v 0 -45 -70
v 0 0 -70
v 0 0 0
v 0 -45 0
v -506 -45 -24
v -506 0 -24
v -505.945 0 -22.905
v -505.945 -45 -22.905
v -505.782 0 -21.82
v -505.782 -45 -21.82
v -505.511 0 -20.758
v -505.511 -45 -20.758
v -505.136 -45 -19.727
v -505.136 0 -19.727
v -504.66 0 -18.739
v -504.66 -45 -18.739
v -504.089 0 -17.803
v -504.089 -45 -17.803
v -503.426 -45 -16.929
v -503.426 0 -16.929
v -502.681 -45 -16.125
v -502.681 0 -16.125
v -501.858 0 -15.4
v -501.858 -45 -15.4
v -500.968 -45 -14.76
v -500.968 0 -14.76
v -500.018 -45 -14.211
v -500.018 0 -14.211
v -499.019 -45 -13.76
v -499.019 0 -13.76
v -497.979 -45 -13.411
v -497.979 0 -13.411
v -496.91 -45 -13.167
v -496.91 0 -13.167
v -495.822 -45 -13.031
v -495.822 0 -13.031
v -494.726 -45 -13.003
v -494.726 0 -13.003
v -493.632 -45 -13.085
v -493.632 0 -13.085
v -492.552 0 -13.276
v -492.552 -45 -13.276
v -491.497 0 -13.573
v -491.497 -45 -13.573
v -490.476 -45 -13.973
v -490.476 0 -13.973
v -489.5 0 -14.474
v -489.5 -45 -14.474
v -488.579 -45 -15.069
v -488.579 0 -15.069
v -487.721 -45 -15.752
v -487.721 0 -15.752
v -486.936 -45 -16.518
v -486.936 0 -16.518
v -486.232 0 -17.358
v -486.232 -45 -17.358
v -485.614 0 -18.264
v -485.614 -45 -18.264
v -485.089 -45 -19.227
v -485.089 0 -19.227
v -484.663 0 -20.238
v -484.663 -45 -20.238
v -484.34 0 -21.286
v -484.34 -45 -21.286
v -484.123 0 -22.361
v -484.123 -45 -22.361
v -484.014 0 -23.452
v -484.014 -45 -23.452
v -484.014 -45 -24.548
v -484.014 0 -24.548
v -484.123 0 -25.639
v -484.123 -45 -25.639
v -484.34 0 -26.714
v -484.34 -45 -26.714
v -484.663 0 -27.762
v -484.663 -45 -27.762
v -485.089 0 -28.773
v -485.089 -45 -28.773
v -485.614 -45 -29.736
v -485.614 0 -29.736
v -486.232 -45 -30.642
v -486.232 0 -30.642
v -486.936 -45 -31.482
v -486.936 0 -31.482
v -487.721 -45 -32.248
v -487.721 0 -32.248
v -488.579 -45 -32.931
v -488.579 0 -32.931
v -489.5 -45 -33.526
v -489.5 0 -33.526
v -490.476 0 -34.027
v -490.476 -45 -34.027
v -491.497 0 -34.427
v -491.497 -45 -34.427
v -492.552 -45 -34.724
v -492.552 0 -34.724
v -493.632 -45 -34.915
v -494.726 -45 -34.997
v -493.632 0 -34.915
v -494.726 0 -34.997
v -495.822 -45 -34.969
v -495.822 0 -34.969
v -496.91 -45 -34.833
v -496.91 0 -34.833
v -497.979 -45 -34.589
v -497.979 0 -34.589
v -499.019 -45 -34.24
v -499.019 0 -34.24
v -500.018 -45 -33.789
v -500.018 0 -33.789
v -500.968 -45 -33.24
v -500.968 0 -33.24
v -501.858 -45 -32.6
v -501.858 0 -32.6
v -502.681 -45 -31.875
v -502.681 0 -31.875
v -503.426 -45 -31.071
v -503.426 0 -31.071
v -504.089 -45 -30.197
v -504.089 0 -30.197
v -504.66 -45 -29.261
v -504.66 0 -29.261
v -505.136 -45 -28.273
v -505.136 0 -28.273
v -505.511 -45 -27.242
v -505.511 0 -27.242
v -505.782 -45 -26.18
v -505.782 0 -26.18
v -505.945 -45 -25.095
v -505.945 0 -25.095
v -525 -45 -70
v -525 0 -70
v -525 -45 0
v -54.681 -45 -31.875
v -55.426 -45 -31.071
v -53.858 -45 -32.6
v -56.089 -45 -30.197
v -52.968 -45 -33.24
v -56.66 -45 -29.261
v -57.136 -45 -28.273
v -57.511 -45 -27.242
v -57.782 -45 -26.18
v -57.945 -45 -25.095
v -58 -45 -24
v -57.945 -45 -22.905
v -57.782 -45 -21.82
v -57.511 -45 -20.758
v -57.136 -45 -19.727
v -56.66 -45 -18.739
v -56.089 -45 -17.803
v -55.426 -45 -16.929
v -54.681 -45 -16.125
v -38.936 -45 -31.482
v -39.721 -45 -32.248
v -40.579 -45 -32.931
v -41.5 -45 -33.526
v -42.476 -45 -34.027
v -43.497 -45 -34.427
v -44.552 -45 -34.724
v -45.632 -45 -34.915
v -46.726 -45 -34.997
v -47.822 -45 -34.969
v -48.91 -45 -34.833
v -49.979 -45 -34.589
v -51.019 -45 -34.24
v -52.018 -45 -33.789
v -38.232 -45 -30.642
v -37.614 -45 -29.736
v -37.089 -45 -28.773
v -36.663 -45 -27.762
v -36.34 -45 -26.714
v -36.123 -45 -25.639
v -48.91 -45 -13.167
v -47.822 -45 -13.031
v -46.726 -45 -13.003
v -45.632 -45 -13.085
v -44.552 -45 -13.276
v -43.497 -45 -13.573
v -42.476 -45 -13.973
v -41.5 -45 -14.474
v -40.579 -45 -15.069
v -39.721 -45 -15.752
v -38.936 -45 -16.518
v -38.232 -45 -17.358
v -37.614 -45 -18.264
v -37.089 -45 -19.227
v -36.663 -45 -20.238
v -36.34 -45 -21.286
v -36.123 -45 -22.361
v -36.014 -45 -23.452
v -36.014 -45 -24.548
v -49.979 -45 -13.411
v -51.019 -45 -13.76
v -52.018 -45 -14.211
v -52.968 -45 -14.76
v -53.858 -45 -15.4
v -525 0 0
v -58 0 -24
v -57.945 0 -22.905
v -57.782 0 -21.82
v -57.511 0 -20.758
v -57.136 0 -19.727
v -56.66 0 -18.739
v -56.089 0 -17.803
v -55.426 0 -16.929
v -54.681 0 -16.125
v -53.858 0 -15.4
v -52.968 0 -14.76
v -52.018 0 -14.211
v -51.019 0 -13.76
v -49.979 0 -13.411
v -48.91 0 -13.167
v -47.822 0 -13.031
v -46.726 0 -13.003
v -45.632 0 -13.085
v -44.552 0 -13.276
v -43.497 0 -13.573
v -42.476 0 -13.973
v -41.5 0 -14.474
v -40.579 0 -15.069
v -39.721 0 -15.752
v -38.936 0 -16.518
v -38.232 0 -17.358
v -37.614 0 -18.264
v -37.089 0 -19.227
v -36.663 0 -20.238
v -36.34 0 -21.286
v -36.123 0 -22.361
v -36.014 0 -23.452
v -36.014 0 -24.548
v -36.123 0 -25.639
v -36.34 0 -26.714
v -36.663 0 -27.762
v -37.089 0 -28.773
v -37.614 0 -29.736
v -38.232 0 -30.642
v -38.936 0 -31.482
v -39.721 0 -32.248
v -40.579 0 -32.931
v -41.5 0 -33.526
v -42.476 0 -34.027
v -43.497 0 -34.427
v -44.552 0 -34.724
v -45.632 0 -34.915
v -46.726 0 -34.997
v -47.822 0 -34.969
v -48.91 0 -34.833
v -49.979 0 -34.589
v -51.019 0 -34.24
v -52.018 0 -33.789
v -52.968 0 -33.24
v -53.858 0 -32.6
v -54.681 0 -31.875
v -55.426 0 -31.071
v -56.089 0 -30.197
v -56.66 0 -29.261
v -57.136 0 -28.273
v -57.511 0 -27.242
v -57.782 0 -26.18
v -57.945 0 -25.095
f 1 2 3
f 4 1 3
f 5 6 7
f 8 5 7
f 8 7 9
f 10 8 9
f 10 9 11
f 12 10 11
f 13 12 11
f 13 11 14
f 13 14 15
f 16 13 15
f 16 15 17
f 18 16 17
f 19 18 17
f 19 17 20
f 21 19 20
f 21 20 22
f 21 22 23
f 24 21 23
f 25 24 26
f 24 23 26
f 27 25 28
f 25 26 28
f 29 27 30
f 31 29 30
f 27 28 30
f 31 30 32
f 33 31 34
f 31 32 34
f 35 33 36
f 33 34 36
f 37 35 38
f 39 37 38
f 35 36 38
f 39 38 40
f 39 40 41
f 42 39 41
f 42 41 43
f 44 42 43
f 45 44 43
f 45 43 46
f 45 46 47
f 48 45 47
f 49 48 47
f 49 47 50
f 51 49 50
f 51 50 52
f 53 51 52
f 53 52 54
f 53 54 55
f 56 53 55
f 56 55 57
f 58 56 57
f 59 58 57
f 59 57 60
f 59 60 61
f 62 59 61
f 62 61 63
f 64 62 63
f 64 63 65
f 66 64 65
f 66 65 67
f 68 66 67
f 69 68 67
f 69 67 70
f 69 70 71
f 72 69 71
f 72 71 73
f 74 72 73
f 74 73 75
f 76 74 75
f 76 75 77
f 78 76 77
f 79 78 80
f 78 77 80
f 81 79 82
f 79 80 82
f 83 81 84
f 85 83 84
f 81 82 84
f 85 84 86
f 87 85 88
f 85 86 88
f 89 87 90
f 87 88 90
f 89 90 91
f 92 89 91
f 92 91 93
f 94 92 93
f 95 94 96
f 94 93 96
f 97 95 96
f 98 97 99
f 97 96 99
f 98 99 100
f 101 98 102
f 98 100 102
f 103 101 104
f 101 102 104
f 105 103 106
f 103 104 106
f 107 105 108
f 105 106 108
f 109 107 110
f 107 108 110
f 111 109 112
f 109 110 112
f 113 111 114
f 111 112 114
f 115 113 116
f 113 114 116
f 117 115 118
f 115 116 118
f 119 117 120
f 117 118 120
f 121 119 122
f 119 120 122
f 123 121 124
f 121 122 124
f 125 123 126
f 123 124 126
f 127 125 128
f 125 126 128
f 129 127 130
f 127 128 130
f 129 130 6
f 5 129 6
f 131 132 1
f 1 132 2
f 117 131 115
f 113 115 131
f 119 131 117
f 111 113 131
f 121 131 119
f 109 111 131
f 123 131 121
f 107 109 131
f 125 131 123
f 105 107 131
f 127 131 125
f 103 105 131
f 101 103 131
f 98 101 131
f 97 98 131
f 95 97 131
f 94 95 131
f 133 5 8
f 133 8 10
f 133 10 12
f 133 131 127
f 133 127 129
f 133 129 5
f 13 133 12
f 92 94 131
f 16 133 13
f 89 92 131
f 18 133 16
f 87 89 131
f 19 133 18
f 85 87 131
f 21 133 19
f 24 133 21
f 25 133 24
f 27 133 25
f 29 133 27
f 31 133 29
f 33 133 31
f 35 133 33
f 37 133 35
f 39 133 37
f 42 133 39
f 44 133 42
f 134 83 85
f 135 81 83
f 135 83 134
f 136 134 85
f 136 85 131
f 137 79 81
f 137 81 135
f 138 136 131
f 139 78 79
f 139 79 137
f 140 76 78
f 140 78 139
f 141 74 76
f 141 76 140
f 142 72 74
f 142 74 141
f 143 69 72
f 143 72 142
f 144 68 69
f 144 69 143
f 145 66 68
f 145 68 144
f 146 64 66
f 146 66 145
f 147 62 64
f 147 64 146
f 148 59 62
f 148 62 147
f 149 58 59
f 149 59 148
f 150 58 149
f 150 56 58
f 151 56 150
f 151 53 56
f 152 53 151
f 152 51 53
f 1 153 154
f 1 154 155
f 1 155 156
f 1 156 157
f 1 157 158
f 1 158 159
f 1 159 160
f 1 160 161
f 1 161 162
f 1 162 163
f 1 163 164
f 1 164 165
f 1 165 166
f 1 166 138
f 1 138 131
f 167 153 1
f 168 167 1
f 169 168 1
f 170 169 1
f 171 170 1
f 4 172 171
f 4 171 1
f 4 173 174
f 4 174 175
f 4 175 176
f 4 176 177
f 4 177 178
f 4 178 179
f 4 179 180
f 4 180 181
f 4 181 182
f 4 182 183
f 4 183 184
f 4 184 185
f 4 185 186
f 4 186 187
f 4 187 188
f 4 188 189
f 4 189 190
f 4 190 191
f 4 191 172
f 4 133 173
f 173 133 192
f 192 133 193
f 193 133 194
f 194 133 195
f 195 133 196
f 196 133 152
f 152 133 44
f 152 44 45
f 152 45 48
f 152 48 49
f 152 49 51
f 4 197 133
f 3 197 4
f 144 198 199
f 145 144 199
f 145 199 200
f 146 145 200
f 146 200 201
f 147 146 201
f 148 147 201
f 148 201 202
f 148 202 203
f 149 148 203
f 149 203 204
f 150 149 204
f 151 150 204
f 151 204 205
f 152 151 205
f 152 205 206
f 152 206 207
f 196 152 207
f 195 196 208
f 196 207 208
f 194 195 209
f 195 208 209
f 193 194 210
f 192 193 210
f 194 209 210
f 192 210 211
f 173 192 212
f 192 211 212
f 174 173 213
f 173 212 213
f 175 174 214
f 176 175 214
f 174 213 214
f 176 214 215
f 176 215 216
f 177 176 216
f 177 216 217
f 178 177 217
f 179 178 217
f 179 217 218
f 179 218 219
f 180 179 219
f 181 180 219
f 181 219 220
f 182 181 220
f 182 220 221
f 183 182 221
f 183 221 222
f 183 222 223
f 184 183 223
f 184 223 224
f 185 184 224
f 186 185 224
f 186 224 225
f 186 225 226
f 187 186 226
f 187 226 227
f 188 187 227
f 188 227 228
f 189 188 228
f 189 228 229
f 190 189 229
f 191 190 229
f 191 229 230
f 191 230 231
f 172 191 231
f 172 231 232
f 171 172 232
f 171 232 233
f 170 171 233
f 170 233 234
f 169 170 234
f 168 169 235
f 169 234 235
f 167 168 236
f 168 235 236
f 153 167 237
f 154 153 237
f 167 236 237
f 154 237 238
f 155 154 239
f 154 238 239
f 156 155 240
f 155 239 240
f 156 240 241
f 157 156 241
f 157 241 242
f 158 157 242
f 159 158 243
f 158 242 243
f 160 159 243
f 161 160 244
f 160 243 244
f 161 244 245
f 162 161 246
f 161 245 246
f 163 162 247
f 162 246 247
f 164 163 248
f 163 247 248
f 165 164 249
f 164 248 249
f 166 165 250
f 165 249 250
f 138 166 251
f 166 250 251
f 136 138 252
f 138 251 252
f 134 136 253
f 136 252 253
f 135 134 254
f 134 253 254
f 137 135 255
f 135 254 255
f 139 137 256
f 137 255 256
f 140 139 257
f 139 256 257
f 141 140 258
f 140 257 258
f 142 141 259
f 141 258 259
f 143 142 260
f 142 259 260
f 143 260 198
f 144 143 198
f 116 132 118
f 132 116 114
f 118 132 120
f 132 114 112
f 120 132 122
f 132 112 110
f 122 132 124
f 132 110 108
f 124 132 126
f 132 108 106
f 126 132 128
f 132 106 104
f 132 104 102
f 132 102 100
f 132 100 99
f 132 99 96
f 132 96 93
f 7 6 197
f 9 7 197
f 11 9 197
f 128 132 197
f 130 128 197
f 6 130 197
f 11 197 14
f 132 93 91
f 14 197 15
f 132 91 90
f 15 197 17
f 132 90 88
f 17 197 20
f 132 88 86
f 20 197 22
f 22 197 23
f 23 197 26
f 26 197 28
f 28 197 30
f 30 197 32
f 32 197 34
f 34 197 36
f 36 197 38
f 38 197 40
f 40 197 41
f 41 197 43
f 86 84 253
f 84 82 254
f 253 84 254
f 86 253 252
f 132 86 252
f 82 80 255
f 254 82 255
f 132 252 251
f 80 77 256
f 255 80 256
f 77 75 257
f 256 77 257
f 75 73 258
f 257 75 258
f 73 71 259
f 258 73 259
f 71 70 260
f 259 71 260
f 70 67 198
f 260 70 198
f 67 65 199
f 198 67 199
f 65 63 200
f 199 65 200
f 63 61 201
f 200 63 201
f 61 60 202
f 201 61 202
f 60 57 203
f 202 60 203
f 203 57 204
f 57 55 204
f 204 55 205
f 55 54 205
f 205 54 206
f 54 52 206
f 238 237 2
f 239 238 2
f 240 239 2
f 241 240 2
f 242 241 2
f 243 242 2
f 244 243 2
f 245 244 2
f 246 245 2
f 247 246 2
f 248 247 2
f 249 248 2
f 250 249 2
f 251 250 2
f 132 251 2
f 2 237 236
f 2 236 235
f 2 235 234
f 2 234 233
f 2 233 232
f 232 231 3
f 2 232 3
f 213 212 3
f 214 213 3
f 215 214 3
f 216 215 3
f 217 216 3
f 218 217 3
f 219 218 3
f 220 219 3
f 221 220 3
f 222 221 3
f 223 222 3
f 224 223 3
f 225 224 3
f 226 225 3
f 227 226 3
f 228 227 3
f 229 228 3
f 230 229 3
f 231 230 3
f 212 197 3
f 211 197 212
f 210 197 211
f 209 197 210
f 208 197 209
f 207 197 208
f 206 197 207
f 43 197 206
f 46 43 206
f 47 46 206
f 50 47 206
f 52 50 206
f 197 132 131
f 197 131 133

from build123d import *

# Parameters (mm, degrees)
F0_W     = 525
F0_H     = 70
F1_DEPTH = 45
F2_R     = 11
F3_DEPTH = 45.001
F4_R     = 11
F5_DEPTH = 45.001


with BuildPart() as f1:
    # F0 (on Front) → F1 (new body)
    with BuildSketch(Plane.XZ):
        with Locations((-262.5, -35)):
            Rectangle(F0_W, F0_H)
    extrude(amount=F1_DEPTH)

    # F2 (on face) → F3 (cut, through all)
    with BuildSketch(Plane(origin=(0, 0, 0), x_dir=(-1, 0, 0), z_dir=(0, 1, 0))):
        with Locations((495, -24)):
            Circle(F2_R)
    extrude(amount=-F3_DEPTH, mode=Mode.SUBTRACT)

    # F4 (on face) → F5 (cut, through all)
    with BuildSketch(Plane(origin=(0, 0, 0), x_dir=(-1, 0, 0), z_dir=(0, 1, 0))):
        with Locations((47, -24)):
            Circle(F4_R)
    extrude(amount=-F5_DEPTH, mode=Mode.SUBTRACT)


solid = f1.part
